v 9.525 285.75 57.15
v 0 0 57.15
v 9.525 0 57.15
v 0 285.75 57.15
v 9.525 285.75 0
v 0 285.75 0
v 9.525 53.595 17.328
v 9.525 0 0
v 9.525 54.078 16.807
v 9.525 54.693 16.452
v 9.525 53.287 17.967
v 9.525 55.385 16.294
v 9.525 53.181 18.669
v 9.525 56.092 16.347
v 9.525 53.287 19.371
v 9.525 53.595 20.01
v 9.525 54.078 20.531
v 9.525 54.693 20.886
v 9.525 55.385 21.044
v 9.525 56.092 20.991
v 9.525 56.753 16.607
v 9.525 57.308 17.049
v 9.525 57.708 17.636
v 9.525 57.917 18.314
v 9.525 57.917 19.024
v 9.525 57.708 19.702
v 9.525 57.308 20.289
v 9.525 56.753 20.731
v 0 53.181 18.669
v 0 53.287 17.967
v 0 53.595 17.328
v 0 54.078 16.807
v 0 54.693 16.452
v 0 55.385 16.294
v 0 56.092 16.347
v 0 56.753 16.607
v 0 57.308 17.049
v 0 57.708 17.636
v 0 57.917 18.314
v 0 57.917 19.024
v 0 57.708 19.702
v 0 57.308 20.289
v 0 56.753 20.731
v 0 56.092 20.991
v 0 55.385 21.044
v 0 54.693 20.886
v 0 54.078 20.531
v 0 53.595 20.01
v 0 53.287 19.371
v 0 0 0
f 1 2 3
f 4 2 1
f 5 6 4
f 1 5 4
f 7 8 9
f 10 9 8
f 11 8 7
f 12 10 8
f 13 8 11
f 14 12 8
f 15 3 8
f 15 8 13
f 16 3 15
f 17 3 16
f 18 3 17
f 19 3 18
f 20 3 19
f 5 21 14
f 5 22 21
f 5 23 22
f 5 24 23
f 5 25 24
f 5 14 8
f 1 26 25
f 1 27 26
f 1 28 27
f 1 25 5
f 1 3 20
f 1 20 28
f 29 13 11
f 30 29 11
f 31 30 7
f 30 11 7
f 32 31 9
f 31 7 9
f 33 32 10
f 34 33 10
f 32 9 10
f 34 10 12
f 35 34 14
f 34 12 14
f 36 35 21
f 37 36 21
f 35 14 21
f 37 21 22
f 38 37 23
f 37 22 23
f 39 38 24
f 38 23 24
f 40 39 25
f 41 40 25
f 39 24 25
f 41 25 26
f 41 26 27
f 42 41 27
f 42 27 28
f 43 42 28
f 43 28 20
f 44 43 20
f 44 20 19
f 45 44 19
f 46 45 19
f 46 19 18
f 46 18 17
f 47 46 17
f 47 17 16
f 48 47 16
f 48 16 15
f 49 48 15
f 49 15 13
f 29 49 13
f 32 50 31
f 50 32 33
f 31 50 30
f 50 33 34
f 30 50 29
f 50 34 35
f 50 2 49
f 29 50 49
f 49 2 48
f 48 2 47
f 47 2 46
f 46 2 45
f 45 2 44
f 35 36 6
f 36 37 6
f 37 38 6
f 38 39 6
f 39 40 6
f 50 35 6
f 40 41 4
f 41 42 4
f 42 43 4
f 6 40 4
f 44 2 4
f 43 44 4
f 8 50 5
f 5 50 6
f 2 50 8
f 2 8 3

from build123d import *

# Parameters (mm, degrees)
F0_W     = 285.75
F0_H     = 57.15
F1_DEPTH = 9.525
F2_D     = 4.7625


with BuildPart() as f1:
    # F0 (on Right) → F1 (new body)
    with BuildSketch(Plane.YZ):
        with Locations((142.875, 28.575)):
            Rectangle(F0_W, F0_H)
    extrude(amount=F1_DEPTH)

    # F2 (through all)
    with Locations(Plane(origin=(0, 0, 0), x_dir=(0, 1, 0), z_dir=(-1, 0, 0))):
        with Locations((55.5625, -18.669)):
            Hole(F2_D / 2)


solid = f1.part
